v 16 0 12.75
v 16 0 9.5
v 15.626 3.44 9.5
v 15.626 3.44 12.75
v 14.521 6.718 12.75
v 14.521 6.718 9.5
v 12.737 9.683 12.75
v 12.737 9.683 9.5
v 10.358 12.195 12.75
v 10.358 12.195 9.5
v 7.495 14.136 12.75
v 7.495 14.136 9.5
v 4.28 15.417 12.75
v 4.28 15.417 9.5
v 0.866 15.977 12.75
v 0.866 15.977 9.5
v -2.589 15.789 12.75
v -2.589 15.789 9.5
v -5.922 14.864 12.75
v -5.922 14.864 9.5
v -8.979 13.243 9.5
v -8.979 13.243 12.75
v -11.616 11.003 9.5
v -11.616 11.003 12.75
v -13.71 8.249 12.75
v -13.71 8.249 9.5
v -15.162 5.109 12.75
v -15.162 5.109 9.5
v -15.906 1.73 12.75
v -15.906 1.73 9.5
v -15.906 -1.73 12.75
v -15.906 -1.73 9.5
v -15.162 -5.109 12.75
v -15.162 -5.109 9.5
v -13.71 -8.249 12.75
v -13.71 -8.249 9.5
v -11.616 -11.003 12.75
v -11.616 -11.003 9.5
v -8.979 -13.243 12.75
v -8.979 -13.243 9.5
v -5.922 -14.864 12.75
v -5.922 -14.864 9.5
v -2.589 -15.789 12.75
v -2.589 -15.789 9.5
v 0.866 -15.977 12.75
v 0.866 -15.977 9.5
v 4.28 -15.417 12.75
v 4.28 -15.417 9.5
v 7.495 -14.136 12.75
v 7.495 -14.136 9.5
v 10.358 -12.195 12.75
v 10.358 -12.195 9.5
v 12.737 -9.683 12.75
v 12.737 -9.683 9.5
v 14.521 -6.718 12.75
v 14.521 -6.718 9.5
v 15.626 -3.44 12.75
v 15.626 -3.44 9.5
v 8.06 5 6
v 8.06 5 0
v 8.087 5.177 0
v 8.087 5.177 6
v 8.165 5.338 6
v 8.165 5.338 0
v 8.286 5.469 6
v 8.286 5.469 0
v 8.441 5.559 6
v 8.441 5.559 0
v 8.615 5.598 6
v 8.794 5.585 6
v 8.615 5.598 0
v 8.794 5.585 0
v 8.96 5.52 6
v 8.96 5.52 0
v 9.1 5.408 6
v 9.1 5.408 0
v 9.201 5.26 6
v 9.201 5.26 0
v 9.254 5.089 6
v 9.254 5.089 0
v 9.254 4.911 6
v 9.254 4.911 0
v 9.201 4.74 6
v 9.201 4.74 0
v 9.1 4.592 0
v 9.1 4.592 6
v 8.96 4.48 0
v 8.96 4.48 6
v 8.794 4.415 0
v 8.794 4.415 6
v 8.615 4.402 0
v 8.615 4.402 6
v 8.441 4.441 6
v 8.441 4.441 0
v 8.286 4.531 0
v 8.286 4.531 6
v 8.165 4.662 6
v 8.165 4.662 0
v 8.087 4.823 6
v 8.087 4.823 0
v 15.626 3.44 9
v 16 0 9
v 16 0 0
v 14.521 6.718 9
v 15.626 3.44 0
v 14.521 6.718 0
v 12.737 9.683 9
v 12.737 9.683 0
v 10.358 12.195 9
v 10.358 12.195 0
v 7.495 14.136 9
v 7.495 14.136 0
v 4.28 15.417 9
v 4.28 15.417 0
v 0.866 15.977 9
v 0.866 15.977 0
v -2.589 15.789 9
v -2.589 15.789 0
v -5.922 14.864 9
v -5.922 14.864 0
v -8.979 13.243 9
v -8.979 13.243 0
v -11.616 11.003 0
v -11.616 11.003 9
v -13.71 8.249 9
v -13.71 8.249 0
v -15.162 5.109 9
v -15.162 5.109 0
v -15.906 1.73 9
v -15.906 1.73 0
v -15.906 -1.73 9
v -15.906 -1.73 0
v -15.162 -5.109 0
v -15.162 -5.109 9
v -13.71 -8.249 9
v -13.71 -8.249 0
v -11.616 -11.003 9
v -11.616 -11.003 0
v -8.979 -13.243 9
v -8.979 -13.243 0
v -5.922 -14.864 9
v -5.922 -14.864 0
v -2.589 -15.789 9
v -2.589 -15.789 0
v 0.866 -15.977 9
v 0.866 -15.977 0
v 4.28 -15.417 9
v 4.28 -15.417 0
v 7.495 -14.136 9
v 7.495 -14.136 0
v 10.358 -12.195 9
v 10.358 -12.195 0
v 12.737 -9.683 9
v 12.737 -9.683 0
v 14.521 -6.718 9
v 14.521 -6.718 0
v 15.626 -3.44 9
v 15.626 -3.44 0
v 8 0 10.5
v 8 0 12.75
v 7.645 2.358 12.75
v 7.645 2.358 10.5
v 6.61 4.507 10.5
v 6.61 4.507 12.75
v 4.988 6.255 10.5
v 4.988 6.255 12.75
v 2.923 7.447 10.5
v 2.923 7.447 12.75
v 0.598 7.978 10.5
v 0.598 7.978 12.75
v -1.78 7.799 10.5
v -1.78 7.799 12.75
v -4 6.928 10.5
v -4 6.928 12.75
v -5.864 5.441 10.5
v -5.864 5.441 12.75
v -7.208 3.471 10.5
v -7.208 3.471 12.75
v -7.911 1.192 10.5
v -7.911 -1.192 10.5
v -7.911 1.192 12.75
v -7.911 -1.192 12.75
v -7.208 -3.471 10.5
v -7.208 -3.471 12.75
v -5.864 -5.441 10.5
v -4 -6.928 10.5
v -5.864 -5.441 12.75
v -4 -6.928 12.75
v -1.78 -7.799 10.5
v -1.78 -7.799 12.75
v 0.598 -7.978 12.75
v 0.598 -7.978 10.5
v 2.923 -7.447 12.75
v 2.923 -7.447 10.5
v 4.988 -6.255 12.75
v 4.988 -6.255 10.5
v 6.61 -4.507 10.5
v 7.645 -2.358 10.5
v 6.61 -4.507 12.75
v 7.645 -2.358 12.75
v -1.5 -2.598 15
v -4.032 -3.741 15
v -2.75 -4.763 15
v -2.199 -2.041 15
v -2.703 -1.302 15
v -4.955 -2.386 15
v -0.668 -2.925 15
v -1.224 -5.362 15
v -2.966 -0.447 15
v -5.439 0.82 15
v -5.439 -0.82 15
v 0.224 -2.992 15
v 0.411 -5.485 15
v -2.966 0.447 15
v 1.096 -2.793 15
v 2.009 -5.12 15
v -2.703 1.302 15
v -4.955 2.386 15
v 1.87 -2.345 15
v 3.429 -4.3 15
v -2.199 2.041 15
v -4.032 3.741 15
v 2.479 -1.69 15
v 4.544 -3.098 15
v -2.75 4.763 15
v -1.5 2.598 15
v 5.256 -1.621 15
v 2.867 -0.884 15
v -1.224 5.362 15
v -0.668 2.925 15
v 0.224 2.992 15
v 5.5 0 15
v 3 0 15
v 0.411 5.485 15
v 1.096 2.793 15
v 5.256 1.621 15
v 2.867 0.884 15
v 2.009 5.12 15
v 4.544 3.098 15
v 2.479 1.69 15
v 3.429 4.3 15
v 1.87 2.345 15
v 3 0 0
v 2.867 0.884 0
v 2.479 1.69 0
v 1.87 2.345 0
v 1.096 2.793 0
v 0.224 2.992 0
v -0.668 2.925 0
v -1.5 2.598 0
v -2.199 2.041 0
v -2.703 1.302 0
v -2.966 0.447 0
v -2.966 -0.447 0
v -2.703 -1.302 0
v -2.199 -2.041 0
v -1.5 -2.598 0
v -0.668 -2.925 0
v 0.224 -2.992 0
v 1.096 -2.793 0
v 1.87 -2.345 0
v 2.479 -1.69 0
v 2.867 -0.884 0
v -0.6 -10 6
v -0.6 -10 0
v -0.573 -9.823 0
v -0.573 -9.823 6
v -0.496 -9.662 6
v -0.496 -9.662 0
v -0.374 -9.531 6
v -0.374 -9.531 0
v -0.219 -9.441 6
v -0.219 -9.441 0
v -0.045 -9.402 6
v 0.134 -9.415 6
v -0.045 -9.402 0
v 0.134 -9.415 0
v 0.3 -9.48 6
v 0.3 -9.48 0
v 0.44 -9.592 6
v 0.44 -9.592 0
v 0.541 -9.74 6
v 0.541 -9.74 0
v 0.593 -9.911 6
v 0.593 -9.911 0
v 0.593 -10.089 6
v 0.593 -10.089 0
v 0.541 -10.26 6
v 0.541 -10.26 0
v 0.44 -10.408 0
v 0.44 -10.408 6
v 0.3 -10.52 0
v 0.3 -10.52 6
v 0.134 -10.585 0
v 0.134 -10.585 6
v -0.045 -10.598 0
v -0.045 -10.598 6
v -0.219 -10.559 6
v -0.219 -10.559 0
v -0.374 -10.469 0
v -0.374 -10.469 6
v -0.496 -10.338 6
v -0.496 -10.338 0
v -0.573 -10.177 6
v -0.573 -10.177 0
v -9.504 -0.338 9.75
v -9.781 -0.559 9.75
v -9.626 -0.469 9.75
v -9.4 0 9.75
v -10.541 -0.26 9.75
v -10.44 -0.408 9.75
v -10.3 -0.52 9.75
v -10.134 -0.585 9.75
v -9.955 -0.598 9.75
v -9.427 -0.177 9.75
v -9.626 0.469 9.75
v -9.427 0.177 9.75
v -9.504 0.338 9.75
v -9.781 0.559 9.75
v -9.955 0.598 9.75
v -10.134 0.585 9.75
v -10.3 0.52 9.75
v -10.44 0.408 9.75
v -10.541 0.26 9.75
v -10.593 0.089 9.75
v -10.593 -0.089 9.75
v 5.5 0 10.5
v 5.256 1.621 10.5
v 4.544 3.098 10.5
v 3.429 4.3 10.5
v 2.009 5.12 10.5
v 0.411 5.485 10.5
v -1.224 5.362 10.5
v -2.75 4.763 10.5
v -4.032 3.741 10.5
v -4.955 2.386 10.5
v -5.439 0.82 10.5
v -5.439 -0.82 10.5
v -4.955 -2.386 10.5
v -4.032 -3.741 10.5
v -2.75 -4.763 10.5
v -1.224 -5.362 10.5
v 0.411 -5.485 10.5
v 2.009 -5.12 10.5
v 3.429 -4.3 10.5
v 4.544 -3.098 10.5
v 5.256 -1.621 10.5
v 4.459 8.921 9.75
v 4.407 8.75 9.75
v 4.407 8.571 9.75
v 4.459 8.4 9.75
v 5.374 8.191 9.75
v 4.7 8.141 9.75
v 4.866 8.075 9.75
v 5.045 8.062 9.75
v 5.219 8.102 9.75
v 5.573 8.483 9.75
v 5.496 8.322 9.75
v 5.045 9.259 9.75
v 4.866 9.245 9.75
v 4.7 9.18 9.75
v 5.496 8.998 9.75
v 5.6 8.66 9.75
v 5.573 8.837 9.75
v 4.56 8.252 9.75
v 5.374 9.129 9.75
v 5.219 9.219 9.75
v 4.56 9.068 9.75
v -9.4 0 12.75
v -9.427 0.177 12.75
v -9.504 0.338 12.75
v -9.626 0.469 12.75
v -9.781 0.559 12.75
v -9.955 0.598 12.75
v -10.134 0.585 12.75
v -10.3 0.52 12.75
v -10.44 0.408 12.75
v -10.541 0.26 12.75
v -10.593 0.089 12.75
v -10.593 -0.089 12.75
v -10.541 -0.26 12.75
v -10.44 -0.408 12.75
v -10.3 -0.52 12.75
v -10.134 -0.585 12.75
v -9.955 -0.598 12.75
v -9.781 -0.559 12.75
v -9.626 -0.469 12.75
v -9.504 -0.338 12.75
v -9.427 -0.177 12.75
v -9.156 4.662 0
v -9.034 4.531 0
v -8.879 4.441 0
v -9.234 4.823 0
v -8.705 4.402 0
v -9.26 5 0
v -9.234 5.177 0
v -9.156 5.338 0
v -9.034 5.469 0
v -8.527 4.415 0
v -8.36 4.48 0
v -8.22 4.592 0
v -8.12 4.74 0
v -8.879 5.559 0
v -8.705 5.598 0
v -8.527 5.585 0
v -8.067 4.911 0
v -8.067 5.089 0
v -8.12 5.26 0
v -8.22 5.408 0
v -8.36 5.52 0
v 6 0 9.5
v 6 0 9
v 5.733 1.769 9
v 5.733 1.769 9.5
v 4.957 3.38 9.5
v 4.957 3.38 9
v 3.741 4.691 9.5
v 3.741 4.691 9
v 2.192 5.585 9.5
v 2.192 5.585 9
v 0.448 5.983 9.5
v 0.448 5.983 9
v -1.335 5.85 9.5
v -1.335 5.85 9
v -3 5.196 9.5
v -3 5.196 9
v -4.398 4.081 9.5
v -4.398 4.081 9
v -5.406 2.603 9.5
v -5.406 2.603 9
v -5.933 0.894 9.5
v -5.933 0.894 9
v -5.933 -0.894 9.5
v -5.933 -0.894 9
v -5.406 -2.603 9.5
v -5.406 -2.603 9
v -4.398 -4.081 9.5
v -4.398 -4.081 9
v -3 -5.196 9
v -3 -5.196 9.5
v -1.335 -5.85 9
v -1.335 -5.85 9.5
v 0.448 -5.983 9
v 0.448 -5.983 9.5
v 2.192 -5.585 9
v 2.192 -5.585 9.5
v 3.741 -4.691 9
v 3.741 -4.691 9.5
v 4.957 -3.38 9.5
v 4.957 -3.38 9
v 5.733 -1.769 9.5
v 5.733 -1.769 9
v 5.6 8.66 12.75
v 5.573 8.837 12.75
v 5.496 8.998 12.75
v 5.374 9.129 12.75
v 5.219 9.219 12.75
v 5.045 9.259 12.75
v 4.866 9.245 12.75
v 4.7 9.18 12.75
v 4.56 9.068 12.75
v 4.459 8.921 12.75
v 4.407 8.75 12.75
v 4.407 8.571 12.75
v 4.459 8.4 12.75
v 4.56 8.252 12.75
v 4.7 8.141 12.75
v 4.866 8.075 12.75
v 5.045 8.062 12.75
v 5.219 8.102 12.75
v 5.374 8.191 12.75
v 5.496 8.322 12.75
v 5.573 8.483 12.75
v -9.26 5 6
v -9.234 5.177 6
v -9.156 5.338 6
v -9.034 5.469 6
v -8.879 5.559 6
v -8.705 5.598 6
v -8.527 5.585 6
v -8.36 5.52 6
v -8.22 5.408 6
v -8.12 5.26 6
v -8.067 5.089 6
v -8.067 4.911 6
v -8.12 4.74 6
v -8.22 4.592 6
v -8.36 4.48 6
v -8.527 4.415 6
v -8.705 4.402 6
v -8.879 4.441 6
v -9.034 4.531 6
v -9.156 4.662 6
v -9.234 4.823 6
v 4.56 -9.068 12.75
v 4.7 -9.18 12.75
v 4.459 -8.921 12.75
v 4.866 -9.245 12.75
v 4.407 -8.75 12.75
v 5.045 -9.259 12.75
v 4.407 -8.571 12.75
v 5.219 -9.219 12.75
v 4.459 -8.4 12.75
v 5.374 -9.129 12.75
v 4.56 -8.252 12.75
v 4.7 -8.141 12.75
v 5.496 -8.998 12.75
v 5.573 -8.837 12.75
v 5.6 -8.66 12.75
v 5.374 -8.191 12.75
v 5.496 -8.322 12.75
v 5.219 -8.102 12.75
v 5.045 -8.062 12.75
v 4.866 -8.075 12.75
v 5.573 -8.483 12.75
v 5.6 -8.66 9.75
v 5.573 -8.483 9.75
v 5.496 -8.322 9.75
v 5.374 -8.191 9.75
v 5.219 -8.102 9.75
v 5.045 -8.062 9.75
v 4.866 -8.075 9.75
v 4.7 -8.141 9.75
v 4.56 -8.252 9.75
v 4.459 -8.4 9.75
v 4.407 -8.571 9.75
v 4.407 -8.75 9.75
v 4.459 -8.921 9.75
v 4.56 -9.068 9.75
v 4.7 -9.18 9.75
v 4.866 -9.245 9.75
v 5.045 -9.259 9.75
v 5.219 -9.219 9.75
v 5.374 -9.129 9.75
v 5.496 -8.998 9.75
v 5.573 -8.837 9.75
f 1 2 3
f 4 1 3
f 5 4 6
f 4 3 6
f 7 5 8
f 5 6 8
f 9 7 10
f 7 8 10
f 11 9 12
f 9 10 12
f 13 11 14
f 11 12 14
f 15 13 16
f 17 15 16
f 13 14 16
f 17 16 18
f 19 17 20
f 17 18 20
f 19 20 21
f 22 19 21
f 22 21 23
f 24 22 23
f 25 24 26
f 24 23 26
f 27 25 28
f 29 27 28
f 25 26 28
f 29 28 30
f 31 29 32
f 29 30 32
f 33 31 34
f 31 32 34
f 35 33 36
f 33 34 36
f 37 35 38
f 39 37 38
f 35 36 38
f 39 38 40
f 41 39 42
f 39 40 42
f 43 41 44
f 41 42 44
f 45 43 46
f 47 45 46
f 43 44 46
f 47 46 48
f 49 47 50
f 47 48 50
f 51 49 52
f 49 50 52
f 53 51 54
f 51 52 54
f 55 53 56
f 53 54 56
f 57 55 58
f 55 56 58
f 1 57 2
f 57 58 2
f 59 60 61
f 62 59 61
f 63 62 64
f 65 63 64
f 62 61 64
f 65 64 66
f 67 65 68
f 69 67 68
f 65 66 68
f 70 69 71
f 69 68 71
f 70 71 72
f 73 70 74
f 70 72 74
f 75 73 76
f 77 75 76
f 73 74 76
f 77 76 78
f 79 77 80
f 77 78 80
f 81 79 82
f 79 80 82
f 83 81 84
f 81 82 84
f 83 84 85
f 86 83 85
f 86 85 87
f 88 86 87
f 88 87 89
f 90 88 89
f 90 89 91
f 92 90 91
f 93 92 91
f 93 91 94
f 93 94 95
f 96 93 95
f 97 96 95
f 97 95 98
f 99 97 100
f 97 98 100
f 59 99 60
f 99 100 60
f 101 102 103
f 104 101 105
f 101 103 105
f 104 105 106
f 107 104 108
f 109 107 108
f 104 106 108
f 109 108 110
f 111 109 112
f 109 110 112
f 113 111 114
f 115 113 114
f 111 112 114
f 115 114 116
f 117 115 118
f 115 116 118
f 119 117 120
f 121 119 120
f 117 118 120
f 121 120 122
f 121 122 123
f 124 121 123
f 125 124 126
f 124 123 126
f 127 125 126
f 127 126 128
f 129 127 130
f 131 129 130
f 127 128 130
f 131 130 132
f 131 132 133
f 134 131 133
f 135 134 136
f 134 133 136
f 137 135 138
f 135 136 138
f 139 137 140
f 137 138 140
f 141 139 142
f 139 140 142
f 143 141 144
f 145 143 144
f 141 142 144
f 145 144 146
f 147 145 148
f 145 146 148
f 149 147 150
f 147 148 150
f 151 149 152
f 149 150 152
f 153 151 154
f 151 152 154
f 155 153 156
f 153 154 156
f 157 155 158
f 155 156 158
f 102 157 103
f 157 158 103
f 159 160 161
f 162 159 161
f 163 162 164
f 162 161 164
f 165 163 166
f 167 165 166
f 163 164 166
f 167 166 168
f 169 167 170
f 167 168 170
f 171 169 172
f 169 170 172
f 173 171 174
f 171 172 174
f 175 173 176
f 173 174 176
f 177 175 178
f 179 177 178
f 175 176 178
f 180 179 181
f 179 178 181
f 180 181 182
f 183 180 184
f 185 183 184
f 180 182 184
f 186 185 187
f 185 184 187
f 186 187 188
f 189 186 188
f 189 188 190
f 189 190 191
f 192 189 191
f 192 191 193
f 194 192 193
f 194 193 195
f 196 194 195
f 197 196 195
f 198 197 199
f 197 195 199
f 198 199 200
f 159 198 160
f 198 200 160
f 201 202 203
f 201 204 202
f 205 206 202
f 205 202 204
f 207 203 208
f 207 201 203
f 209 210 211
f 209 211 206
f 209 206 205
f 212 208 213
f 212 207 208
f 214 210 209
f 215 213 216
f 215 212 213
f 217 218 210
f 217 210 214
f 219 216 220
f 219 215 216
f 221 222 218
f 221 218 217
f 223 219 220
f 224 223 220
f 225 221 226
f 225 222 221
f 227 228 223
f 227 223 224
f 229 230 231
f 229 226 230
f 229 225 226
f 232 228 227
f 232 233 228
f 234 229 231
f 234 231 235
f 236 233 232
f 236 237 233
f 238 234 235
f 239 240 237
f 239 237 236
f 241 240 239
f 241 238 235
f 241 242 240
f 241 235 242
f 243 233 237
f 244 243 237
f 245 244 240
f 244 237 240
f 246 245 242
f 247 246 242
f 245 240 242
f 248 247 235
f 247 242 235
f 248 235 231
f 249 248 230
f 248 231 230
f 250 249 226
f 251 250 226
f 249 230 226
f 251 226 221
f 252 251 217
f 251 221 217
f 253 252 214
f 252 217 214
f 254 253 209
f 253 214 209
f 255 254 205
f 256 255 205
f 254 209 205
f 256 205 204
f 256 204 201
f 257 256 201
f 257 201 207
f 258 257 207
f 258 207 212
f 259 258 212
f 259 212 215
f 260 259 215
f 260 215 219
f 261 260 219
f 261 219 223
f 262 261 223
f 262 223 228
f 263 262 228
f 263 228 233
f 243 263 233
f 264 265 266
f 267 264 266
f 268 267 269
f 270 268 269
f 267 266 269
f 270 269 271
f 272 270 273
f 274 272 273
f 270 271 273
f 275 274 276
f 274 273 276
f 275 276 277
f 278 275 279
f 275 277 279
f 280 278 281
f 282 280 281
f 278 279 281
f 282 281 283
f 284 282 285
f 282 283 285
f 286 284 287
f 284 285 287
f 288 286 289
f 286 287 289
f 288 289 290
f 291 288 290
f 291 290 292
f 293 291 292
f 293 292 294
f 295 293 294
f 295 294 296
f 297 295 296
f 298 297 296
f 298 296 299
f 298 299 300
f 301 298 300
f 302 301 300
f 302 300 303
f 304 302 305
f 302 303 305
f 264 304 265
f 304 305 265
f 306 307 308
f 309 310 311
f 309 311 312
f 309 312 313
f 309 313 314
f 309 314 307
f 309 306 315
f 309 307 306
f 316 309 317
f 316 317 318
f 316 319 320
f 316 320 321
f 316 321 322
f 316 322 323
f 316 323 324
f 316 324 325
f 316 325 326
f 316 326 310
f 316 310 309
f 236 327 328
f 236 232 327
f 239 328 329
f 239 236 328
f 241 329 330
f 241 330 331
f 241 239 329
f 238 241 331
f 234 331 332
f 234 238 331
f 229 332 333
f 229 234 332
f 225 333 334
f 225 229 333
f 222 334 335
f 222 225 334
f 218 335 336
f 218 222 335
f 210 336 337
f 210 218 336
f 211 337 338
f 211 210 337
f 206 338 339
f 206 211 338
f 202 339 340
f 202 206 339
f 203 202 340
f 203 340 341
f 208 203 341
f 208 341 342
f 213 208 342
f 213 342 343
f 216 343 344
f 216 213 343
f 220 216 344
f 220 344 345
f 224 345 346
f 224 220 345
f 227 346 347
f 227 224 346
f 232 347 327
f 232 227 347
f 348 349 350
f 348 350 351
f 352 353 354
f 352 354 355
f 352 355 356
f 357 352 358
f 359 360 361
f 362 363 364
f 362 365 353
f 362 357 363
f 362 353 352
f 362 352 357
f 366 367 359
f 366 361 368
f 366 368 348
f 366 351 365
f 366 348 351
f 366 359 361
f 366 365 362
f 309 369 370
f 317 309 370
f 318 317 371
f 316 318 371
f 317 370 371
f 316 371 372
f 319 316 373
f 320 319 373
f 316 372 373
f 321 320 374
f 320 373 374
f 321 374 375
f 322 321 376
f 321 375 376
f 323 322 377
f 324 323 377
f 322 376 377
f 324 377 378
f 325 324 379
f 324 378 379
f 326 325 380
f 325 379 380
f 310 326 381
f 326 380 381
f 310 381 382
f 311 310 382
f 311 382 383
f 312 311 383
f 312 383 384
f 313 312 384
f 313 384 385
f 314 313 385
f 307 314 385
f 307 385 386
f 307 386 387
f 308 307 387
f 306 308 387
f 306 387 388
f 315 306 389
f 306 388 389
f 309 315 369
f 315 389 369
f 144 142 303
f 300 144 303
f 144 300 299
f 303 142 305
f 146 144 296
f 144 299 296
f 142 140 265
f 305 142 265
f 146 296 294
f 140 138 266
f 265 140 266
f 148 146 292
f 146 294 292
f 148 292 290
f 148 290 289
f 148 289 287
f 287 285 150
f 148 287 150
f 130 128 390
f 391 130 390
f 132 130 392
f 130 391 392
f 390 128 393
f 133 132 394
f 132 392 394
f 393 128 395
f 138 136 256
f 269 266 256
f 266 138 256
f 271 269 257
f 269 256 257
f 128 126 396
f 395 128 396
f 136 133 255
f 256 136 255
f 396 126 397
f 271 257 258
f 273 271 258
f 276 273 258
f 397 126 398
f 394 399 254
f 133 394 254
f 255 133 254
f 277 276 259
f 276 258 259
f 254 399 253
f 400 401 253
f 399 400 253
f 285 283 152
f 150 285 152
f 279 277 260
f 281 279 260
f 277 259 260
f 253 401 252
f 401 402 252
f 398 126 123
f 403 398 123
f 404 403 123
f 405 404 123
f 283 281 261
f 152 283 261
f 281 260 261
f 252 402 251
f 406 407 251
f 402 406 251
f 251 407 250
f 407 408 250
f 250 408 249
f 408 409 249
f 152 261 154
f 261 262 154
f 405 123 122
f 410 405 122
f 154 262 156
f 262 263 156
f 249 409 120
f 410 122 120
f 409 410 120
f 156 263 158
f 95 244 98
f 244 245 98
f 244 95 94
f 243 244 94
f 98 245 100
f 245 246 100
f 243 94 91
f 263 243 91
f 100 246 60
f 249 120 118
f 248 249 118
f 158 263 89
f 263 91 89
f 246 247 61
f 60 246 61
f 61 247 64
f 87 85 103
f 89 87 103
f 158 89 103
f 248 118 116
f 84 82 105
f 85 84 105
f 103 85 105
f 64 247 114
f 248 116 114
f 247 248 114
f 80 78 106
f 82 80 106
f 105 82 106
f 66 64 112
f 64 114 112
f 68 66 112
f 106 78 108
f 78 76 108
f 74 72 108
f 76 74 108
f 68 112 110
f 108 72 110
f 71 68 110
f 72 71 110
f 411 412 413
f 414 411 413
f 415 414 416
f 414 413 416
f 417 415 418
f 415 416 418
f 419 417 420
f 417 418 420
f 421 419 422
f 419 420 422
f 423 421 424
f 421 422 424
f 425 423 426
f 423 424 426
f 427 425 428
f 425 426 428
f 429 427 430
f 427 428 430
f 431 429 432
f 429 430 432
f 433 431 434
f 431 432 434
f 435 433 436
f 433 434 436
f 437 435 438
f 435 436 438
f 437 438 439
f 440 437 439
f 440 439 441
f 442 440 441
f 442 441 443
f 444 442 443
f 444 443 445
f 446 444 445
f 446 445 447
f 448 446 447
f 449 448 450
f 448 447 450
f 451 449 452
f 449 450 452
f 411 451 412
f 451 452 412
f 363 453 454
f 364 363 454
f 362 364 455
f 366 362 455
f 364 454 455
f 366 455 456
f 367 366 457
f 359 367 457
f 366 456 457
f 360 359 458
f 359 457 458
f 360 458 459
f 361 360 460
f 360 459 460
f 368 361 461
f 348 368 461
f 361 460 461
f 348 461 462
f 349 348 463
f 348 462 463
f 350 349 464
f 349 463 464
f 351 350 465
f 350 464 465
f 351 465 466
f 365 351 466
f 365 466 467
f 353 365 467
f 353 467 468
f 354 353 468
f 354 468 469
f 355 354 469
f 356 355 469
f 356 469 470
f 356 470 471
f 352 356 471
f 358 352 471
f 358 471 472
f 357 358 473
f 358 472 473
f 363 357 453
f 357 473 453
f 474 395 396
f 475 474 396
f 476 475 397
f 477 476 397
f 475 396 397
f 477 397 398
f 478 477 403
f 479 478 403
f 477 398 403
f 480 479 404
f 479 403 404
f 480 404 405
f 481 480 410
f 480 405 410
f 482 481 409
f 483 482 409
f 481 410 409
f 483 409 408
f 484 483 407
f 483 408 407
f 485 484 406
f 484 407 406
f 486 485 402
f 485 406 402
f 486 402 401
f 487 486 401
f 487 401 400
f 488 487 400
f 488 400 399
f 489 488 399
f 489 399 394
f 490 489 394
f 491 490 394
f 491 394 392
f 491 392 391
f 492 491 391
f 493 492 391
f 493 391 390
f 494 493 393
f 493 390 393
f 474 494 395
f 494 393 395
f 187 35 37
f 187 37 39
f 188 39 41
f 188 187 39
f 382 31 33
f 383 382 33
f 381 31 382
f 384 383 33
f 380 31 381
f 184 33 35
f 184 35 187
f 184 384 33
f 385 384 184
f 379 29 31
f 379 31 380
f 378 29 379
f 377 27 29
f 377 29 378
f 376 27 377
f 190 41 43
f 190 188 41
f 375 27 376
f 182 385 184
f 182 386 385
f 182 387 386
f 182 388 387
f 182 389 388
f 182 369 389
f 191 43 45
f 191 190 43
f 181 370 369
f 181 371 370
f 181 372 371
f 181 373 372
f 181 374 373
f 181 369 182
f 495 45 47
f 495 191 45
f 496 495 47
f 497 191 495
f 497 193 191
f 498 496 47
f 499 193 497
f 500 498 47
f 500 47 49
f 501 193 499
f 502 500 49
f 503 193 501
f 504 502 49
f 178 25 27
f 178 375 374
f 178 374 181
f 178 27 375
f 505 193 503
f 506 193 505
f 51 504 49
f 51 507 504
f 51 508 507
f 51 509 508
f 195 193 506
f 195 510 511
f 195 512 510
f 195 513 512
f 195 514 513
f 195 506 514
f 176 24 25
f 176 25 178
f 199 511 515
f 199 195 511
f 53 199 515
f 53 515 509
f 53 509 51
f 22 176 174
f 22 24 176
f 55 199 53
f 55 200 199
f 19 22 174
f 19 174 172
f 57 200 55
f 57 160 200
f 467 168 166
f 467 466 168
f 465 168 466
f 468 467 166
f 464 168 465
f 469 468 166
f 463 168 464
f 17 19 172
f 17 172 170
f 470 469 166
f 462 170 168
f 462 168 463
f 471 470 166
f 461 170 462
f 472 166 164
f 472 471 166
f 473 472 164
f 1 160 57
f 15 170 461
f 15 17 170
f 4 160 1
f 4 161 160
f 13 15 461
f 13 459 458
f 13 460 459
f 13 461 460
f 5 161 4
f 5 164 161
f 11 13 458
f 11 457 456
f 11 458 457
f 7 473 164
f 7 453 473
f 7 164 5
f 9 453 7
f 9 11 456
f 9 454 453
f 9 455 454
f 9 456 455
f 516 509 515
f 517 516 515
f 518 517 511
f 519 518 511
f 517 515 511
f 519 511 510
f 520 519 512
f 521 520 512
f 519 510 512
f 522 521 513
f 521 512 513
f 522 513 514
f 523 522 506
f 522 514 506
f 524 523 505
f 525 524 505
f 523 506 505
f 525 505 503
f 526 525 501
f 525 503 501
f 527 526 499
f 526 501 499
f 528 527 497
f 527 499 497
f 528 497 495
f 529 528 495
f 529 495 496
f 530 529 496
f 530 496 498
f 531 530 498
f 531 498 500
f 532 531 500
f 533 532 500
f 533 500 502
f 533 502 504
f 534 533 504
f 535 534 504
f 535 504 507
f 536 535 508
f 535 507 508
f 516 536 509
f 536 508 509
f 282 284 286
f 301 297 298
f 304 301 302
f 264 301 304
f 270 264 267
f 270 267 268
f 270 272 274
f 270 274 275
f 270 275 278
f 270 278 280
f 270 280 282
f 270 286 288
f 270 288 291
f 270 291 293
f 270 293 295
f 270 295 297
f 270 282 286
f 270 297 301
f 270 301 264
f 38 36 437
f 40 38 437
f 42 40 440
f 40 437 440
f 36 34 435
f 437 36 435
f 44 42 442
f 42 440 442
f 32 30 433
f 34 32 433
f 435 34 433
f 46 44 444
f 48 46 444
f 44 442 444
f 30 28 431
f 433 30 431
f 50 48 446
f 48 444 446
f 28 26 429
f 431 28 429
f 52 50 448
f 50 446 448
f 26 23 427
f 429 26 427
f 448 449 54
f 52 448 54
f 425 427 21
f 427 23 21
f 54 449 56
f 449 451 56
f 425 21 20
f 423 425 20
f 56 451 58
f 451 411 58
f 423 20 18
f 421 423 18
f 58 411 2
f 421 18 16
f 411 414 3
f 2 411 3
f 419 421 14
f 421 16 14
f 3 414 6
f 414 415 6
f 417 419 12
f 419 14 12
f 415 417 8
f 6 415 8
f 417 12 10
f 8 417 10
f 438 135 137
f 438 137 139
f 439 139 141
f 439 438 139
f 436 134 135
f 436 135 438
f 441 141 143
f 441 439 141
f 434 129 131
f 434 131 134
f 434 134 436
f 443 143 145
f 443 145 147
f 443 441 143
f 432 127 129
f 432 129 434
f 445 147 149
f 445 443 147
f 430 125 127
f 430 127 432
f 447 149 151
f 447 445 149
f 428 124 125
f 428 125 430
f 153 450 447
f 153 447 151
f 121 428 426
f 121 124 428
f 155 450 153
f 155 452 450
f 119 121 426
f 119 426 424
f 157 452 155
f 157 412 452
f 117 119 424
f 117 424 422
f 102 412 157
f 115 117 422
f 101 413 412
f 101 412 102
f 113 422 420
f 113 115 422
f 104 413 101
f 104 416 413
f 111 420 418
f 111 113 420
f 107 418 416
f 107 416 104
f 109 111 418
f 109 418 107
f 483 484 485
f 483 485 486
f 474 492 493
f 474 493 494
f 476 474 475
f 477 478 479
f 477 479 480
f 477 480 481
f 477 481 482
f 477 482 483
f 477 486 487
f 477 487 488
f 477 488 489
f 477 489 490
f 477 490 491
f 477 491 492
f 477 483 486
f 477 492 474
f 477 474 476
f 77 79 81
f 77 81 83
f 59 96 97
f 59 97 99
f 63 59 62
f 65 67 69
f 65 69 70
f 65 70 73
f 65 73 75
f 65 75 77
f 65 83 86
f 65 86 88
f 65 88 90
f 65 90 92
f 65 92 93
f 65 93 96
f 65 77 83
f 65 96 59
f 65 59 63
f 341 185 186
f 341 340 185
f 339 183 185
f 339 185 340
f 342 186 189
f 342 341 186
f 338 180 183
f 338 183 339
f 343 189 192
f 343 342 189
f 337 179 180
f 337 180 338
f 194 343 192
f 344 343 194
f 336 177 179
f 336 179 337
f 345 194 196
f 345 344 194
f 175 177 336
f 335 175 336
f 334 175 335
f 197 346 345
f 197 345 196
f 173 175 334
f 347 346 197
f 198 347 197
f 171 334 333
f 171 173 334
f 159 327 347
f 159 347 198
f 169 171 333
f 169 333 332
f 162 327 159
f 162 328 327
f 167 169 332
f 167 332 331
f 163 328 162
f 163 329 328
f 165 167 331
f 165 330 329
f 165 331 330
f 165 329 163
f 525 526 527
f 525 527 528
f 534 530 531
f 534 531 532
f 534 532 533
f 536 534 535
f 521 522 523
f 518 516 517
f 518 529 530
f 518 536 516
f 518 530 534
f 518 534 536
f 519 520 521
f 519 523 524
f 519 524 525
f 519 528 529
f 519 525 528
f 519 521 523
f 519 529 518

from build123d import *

# Parameters (mm, degrees)
SKETCH_1_R          = 16
EXTRUDE_1_DEPTH     = 9
SKETCH_2_R          = 6
EXTRUDE_2_DEPTH     = 0.5
SKETCH_3_R          = 16
EXTRUDE_3_DEPTH     = 3.25
SKETCH_4_R          = 5.5
EXTRUDE_4_DEPTH     = 2.25
SKETCH_5_R          = 3
CUT_EXTRUDE_1_DEPTH = 26.25
SKETCH_6_R          = 8
SKETCH_6_R_2        = 5.5
CUT_EXTRUDE_2_DEPTH = 2.25
SKETCH_7_R          = 0.6
CUT_EXTRUDE_3_DEPTH = 6
SKETCH_8_R          = 0.6
CUT_EXTRUDE_4_DEPTH = 3


with BuildPart() as part:
    # 草图1 → 凸台-拉伸1 (new body)
    with BuildSketch(Plane.XY):
        Circle(SKETCH_1_R)
    extrude(amount=EXTRUDE_1_DEPTH)

    # 草图2 → 凸台-拉伸2 (add)
    with BuildSketch(Plane.XY.offset(9)):
        Circle(SKETCH_2_R)
    extrude(amount=EXTRUDE_2_DEPTH)

    # 草图3 → 凸台-拉伸3 (add)
    with BuildSketch(Plane.XY.offset(9.5)):
        Circle(SKETCH_3_R)
    extrude(amount=EXTRUDE_3_DEPTH)

    # 草图4 → 凸台-拉伸4 (add)
    with BuildSketch(Plane.XY.offset(12.75)):
        Circle(SKETCH_4_R)
    extrude(amount=EXTRUDE_4_DEPTH)

    # 草图5 → 切除-拉伸1 (cut)
    with BuildSketch(Plane.XY.offset(15)):
        Circle(SKETCH_5_R)
    extrude(amount=-CUT_EXTRUDE_1_DEPTH, mode=Mode.SUBTRACT)

    # 草图6 → 切除-拉伸2 (cut)
    with BuildSketch(Plane.XY.offset(12.75)):
        Circle(SKETCH_6_R)
        Circle(SKETCH_6_R_2, mode=Mode.SUBTRACT)
    extrude(amount=-CUT_EXTRUDE_2_DEPTH, mode=Mode.SUBTRACT)

    # 草图7 → 切除-拉伸3 (cut)
    with BuildSketch(Plane(origin=(0, 0, 0), x_dir=(-1, 0, 0), z_dir=(0, 0, -1))):
        with Locations((8.660254038, 5)):
            Circle(SKETCH_7_R)
        with Locations((-8.660254038, 5)):
            Circle(SKETCH_7_R)
        with Locations((0, -10)):
            Circle(SKETCH_7_R)
    extrude(amount=-CUT_EXTRUDE_3_DEPTH, mode=Mode.SUBTRACT)

    # 草图8 → 切除-拉伸4 (cut)
    with BuildSketch(Plane.XY.offset(12.75)):
        with Locations((5, -8.660254038)):
            Circle(SKETCH_8_R)
        with Locations((5, 8.660254038)):
            Circle(SKETCH_8_R)
        with Locations((-10, 0)):
            Circle(SKETCH_8_R)
    extrude(amount=-CUT_EXTRUDE_4_DEPTH, mode=Mode.SUBTRACT)


solid = part.part
